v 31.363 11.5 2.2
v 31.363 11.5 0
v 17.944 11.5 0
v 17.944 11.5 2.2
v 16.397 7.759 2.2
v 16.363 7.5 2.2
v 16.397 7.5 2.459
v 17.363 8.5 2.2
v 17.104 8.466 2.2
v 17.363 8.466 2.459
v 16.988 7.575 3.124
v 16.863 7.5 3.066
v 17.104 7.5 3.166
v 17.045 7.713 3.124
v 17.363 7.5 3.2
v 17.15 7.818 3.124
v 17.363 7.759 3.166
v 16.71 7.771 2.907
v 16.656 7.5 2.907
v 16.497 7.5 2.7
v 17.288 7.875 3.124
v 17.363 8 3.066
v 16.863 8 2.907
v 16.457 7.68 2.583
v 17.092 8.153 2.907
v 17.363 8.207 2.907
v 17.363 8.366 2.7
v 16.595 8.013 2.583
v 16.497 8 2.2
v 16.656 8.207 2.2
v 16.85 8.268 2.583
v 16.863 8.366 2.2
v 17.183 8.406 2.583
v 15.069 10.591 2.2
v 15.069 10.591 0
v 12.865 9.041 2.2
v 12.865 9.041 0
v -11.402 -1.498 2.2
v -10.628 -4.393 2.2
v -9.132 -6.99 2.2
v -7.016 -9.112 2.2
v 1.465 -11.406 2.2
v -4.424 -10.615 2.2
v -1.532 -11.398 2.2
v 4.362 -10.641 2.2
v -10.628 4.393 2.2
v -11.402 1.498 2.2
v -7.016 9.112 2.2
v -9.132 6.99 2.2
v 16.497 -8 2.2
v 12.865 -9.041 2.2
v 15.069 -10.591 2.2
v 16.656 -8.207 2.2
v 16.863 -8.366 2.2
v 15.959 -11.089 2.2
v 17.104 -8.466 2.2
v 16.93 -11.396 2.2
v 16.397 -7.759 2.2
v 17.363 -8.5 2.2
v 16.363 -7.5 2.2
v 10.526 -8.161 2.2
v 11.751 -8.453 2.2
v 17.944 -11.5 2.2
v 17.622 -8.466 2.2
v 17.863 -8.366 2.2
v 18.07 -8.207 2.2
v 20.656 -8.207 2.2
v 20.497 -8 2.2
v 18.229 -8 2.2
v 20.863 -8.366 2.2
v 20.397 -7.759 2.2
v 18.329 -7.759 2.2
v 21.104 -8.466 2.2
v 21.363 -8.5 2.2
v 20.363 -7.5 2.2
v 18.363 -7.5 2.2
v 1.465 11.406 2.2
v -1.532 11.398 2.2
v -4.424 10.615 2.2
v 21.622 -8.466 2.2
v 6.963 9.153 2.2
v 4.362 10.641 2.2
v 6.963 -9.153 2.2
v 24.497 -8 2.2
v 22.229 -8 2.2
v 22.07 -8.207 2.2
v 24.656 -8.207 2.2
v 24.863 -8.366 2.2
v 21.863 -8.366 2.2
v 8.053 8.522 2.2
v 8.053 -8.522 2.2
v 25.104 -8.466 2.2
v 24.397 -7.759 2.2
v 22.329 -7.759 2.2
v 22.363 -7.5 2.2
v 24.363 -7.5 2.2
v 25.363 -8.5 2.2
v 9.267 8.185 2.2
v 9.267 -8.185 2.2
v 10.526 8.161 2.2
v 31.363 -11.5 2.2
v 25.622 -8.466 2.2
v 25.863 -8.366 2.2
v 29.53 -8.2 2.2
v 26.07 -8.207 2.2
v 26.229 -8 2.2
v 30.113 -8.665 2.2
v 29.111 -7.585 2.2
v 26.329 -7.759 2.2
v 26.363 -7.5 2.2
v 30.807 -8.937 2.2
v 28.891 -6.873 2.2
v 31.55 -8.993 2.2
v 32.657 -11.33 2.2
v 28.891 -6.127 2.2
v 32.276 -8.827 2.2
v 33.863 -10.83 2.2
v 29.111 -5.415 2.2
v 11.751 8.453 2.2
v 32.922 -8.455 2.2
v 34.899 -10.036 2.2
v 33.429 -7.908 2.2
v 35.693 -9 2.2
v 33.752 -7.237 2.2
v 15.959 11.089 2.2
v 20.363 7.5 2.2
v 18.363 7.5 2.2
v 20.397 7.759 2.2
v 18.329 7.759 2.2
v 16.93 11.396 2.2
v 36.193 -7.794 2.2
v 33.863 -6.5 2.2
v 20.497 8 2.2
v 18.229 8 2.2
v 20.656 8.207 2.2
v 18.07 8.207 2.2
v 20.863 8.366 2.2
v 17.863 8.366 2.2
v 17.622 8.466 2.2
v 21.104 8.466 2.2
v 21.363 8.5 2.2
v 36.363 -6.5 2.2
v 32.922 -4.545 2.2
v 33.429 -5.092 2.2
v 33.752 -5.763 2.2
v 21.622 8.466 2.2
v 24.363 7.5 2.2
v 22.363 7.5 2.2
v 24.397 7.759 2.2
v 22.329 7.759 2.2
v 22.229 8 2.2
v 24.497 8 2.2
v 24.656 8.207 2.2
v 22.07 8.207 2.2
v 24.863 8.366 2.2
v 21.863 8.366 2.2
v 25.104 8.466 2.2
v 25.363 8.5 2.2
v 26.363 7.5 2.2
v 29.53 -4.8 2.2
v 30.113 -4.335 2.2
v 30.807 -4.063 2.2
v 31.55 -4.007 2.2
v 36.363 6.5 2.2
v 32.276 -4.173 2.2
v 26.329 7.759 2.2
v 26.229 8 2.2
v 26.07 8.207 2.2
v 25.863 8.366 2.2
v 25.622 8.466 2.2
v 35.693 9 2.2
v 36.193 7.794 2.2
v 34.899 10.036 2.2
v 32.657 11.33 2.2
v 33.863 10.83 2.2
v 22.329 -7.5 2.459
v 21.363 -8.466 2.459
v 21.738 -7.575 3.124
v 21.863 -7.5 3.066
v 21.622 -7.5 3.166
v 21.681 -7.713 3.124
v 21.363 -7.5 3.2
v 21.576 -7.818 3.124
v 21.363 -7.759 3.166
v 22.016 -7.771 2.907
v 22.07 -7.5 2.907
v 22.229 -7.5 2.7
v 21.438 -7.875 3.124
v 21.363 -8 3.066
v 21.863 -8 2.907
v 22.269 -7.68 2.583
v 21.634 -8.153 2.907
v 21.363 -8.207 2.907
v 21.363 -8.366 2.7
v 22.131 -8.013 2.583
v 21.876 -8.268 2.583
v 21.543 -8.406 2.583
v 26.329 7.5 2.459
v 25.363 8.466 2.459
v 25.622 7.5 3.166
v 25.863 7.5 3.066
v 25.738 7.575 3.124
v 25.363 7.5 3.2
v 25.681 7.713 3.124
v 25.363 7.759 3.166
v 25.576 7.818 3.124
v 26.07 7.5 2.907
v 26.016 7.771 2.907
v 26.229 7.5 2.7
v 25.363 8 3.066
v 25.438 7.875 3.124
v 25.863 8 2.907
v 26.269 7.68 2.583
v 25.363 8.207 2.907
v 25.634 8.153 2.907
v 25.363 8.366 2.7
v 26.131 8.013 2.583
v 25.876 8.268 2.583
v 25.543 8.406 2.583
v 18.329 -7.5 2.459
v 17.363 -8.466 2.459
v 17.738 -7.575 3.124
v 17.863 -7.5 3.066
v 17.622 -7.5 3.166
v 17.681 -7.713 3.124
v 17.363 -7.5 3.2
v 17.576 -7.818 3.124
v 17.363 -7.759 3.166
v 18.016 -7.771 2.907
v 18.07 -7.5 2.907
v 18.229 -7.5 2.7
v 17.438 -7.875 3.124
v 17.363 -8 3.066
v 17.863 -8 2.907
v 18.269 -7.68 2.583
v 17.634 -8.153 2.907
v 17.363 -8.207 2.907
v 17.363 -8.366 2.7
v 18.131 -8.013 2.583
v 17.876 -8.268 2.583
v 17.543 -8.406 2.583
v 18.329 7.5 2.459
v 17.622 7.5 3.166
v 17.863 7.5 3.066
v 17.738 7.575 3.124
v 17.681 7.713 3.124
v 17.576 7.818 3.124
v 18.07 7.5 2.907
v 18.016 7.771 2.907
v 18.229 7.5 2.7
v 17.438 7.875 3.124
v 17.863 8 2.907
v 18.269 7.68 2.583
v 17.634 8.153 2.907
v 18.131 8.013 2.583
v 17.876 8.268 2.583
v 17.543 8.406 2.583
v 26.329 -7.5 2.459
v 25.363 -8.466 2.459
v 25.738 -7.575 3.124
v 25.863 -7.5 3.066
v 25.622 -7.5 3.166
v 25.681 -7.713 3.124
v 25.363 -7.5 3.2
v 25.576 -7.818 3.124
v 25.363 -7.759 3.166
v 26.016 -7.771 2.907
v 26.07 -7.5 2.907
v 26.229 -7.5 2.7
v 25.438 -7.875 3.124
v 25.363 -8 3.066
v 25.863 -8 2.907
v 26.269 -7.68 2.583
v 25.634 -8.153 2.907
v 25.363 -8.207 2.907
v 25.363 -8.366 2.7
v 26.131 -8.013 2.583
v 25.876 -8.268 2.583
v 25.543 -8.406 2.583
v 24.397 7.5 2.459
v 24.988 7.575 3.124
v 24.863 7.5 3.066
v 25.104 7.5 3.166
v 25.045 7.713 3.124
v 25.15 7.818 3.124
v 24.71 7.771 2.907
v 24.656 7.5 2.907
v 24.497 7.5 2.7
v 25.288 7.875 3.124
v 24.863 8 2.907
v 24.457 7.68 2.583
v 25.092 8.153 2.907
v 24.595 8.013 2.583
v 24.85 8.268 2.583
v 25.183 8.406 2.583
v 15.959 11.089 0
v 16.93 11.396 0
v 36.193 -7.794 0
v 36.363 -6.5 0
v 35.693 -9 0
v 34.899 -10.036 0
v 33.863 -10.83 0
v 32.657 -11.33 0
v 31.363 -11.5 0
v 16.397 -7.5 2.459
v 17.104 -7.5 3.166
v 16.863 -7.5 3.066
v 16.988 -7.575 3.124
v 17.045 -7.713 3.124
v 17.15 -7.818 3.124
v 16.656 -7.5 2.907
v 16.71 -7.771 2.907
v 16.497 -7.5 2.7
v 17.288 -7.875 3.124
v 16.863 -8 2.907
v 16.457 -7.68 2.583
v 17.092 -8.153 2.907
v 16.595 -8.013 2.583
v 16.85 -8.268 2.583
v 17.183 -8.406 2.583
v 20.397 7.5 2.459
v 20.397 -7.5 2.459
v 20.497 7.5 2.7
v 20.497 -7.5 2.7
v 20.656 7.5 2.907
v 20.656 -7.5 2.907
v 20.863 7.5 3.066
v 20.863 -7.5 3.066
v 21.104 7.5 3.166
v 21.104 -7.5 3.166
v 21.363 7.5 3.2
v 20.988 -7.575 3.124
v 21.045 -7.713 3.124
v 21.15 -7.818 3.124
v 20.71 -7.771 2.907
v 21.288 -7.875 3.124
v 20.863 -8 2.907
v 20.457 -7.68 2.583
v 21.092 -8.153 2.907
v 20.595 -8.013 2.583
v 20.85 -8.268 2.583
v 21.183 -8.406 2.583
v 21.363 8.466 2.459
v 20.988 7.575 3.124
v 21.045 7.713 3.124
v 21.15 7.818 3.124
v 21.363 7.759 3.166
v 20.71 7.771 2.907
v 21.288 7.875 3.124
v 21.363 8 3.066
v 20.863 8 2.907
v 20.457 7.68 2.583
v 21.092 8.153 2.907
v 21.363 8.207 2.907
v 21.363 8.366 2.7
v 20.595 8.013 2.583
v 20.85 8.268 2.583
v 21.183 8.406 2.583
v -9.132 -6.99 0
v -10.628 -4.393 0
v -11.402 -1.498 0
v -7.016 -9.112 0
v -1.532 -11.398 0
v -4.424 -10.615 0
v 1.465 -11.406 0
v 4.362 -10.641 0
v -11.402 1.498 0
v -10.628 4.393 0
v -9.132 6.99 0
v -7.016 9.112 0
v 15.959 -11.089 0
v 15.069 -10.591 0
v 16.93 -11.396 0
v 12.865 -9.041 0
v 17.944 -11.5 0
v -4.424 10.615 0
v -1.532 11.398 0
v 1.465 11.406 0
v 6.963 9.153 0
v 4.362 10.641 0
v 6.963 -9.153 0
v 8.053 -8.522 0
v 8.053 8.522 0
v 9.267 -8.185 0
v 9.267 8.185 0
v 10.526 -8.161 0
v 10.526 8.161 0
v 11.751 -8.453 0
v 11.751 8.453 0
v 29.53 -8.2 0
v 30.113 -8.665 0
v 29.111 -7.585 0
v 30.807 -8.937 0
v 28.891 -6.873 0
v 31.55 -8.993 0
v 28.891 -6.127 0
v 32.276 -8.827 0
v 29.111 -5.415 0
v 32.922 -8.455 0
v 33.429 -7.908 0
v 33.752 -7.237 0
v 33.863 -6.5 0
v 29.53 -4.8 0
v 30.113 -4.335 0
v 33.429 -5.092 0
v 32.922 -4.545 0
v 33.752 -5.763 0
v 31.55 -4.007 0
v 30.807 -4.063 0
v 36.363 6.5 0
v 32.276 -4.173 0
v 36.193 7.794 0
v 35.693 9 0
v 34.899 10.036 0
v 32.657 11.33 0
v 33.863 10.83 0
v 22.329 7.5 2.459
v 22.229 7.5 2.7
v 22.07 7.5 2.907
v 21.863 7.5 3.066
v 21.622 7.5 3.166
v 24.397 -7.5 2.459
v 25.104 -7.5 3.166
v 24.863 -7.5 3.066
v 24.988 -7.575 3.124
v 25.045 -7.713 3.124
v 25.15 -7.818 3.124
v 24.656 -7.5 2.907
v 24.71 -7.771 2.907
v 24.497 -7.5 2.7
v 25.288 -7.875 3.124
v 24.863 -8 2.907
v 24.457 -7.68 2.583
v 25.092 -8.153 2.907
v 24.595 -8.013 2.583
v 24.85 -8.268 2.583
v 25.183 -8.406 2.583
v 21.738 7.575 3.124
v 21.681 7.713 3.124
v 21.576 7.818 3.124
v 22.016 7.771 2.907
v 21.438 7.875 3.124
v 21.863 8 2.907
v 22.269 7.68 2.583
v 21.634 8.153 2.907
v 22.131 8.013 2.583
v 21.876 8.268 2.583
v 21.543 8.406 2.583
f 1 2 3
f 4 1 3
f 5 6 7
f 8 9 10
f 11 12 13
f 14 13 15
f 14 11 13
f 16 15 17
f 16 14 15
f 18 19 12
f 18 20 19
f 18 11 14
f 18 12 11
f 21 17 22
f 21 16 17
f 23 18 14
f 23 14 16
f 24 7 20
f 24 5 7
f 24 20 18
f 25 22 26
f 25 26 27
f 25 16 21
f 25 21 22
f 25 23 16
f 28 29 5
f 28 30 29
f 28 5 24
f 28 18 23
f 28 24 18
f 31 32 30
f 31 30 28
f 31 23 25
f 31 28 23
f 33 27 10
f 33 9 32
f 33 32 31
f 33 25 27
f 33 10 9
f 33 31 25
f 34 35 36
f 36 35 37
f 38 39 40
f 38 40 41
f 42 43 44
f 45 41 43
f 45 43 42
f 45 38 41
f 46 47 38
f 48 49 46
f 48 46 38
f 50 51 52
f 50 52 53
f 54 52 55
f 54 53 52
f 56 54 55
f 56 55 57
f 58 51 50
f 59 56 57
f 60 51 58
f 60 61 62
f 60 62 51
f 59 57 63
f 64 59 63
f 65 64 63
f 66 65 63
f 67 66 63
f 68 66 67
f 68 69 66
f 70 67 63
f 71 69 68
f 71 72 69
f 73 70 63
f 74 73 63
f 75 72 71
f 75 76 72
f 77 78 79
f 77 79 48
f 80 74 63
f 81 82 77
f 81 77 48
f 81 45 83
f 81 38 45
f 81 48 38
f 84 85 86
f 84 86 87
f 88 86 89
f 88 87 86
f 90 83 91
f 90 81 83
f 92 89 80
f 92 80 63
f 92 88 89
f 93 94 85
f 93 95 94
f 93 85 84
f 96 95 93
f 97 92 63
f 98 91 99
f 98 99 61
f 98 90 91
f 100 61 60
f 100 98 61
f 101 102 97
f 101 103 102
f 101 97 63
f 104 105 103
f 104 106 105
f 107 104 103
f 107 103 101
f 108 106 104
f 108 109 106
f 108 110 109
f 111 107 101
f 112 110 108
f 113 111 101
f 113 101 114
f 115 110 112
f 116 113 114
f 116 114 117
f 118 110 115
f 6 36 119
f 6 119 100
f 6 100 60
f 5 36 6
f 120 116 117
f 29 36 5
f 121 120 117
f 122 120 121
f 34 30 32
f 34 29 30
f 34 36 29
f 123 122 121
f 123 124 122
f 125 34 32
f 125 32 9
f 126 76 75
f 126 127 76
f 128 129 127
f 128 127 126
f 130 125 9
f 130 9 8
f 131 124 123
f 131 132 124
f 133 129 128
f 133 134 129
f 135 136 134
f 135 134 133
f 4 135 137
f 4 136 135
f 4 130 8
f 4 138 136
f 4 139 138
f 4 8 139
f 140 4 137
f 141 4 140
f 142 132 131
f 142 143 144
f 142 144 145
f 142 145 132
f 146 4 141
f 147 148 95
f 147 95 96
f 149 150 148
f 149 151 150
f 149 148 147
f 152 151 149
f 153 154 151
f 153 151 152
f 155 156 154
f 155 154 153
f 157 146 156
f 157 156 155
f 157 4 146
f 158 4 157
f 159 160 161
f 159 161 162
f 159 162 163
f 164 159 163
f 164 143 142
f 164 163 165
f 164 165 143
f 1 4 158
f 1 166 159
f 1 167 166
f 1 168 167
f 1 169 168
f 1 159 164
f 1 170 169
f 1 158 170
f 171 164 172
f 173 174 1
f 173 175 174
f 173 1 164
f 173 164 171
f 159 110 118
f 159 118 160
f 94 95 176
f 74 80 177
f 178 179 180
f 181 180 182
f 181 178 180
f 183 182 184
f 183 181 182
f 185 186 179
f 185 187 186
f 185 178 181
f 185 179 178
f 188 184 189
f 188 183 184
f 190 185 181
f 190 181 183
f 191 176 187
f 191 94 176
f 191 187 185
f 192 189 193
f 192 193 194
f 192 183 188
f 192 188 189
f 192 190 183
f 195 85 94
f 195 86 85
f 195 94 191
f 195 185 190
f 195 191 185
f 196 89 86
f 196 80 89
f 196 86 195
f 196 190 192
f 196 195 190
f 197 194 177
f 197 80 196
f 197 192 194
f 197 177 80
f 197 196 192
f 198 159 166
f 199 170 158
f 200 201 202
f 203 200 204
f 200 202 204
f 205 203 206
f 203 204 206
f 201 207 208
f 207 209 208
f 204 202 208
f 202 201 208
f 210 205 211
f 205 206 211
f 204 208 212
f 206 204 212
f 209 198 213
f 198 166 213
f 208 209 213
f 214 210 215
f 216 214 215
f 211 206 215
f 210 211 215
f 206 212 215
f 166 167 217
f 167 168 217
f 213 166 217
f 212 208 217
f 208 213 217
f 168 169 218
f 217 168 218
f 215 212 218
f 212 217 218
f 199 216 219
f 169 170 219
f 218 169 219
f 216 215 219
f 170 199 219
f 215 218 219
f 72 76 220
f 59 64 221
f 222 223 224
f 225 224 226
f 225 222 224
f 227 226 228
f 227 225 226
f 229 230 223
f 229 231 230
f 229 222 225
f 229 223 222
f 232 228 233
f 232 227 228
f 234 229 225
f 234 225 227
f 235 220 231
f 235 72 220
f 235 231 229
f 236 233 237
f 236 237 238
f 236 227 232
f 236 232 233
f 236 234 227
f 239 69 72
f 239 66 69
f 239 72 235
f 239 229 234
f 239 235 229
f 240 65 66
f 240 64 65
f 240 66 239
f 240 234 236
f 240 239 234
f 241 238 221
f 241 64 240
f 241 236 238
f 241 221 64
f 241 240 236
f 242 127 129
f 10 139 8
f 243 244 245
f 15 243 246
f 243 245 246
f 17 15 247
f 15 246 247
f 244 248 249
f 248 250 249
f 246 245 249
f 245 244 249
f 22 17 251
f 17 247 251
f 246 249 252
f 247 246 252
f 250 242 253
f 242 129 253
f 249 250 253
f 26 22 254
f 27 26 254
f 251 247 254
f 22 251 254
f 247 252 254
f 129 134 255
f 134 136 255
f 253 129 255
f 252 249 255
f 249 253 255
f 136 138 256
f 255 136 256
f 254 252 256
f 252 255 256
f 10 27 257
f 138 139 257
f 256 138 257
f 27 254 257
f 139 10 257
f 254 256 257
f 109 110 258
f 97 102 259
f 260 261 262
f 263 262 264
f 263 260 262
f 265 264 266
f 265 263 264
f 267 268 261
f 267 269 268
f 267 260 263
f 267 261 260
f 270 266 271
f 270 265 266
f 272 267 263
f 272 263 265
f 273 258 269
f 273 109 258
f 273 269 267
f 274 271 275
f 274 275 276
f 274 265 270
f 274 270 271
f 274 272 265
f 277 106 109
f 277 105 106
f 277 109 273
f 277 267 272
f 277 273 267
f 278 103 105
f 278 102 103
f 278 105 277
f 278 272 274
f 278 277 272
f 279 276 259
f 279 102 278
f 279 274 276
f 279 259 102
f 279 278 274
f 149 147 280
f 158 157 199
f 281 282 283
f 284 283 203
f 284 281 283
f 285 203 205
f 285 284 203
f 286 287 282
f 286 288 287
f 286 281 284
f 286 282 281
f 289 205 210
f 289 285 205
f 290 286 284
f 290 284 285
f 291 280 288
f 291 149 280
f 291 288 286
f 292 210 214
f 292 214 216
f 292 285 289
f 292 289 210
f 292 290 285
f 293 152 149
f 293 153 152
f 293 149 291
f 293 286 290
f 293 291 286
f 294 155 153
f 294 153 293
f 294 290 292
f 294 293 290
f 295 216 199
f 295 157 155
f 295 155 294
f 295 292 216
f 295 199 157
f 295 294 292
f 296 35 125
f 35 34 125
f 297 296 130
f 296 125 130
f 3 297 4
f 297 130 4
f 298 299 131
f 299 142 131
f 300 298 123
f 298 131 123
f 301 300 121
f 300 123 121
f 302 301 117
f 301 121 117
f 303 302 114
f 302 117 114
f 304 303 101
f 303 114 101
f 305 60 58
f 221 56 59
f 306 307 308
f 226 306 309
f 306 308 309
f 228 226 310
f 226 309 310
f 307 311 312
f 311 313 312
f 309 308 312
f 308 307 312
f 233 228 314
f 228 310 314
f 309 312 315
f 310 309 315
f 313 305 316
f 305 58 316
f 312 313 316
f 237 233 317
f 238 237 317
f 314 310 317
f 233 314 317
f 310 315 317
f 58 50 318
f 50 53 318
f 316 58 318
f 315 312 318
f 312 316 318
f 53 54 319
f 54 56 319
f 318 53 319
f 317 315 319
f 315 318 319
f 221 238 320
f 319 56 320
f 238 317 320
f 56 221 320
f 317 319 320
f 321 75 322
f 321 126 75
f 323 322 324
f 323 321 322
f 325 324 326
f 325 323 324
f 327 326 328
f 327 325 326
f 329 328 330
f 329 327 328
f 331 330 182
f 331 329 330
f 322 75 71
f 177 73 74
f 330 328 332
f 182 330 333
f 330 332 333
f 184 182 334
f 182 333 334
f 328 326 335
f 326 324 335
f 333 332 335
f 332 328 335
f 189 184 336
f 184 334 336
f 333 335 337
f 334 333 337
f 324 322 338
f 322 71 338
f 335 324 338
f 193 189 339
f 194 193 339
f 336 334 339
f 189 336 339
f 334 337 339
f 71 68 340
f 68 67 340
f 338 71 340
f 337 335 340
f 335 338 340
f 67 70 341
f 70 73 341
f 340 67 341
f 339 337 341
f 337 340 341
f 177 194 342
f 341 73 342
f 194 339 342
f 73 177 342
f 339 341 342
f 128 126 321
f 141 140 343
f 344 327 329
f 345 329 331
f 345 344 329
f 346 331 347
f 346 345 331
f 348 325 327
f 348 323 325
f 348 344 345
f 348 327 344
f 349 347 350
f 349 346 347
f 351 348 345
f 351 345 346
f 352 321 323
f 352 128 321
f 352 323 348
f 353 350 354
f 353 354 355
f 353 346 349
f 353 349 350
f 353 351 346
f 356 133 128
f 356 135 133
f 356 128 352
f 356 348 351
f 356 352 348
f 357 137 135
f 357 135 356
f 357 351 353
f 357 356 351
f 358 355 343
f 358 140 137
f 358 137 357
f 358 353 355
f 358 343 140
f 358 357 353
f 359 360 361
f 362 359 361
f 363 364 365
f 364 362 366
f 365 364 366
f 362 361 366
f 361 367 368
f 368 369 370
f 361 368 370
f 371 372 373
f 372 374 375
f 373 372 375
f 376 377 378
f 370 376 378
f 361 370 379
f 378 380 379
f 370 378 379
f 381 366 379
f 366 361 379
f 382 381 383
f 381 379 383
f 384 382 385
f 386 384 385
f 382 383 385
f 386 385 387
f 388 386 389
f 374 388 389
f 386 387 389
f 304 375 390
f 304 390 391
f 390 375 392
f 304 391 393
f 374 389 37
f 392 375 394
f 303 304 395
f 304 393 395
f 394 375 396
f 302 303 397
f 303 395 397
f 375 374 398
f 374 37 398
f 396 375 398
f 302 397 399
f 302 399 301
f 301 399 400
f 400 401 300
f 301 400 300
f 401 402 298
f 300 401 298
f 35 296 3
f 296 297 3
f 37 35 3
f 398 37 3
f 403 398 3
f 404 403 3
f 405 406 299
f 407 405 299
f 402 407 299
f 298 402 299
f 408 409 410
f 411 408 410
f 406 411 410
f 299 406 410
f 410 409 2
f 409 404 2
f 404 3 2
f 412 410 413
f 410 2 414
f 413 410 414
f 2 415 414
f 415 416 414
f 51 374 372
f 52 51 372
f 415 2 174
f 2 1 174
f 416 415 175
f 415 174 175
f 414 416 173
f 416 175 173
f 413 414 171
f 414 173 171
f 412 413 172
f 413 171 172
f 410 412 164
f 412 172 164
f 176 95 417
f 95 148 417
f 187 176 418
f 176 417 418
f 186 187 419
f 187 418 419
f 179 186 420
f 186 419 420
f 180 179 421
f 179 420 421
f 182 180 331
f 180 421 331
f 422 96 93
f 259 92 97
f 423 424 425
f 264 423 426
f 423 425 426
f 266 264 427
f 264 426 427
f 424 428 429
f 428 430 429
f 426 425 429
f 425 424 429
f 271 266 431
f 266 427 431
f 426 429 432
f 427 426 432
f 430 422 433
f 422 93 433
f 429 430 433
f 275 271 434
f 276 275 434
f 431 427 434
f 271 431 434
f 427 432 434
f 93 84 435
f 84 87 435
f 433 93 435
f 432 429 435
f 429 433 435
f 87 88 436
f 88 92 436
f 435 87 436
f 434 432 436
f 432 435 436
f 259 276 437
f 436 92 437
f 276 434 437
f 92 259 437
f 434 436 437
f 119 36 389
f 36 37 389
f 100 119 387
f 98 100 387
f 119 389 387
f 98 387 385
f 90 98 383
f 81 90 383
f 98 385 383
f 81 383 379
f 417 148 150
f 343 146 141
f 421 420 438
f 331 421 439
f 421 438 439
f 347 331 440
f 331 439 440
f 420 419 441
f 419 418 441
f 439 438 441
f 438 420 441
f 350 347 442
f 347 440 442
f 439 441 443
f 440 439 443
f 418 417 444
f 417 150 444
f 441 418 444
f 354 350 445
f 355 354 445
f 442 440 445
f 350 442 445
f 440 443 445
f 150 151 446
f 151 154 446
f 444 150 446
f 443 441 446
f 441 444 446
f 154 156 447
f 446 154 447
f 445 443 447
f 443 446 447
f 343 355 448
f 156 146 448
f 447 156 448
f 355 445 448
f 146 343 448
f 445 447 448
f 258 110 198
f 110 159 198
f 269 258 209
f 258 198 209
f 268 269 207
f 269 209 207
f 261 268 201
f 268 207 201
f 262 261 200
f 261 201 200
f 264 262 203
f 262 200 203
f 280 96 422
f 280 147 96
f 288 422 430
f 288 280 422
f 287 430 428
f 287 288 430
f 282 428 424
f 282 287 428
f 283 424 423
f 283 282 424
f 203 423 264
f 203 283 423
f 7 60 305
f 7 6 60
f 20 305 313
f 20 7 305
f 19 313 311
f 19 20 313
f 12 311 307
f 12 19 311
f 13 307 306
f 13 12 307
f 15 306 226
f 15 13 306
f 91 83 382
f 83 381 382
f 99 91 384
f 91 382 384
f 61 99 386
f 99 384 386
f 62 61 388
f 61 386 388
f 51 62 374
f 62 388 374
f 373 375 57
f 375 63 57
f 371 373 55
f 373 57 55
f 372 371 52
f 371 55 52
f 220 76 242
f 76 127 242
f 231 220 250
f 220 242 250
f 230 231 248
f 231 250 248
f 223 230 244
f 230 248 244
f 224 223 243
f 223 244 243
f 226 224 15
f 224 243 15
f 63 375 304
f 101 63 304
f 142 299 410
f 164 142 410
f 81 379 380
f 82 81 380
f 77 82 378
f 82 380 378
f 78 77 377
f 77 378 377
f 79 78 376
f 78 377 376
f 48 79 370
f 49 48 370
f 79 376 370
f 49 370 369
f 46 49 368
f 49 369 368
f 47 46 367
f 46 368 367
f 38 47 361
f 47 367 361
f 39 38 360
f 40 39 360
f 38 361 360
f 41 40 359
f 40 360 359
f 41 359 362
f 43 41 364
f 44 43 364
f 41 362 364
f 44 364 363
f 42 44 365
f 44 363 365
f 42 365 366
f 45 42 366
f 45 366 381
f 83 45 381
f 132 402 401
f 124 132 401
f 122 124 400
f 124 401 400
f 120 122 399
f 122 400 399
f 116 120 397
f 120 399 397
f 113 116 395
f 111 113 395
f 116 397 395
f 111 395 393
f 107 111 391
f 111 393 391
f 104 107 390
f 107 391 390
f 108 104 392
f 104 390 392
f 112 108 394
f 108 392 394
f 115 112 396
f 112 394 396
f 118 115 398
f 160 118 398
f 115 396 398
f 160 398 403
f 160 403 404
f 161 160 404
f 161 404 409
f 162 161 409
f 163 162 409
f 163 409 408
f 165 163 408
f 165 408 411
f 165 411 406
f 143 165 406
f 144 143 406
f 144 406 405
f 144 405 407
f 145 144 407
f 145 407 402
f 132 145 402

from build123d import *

# Parameters (mm, degrees)
F0_R     = 11.5
F1_DEPTH = 2.2
F3_DEPTH = 2.2
F4_R     = 2.5
F5_DEPTH = 2.201
F6_R     = 5
F7_W     = 2
F7_H     = 17
F8_DEPTH = 1
F9_R     = 0.99999


# Not quite as in the source:
# - a fillet or chamfer is up to 0.001 mm smaller than in the source, because OpenCascade refuses the exact size


with BuildPart() as f1:
    # F0 (on Top) → F1 (new body)
    with BuildSketch(Plane.XY):
        Circle(F0_R)
    extrude(amount=F1_DEPTH)

    # F2 (on Top) → F3 (join)
    with BuildSketch(Plane.XY):
        Polygon((16.363068172, 11.5), (0, 0), (16.363068172, -11.5), (36.363068172, -11.5), (36.363068172, 11.5), align=None)
    extrude(amount=F3_DEPTH)

    # F4 (on face) → F5 (cut, through all)
    with BuildSketch(Plane(origin=(0, 0, 0), x_dir=(1, 0, 0), z_dir=(0, 0, -1))):
        with Locations((31.363068172, 6.5)):
            Circle(F4_R)
    extrude(amount=-F5_DEPTH, mode=Mode.SUBTRACT)

    # F6
    f6_edges = [f1.edges().sort_by_distance(p)[0] for p in [
        (36.363068, -11.5, 1.1),
        (36.363068, 11.5, 1.1),
        (16.363068, -11.5, 1.1),
        (9.408764, -6.6125, 1.1),
        (9.408764, 6.6125, 1.1),
        (16.363068, 11.5, 1.1),
    ]]
    fillet(f6_edges, radius=F6_R)

    # F7 (on face) → F8 (join)
    with BuildSketch(Plane.XY.offset(2.2)):
        with Locations((17.363068172, 0)):
            Rectangle(F7_W, F7_H)
        with Locations((21.363068172, 0)):
            Rectangle(F7_W, F7_H)
        with Locations((25.363068172, 0)):
            Rectangle(F7_W, F7_H)
    extrude(amount=F8_DEPTH)

    # F9 (radius 1 in the source; OpenCascade refuses exactly that, so slightly less here)
    f9_edges = [f1.edges().sort_by_distance(p)[0] for p in [
        (16.363068, -8.5, 2.7),
        (18.363068, -8.5, 2.7),
        (20.363068, -8.5, 2.7),
        (22.363068, -8.5, 2.7),
        (24.363068, -8.5, 2.7),
        (26.363068, -8.5, 2.7),
        (26.363068, 8.5, 2.7),
        (16.363068, 8.5, 2.7),
        (24.363068, 8.5, 2.7),
        (22.363068, 8.5, 2.7),
        (18.363068, 8.5, 2.7),
        (20.363068, 8.5, 2.7),
        (20.363068, 0, 3.2),
        (22.363068, 0, 3.2),
        (21.363068, 8.5, 3.2),
        (21.363068, -8.5, 3.2),
        (18.363068, 0, 3.2),
        (16.363068, 0, 3.2),
        (17.363068, 8.5, 3.2),
        (17.363068, -8.5, 3.2),
        (26.363068, 0, 3.2),
        (24.363068, 0, 3.2),
        (25.363068, 8.5, 3.2),
        (25.363068, -8.5, 3.2),
    ]]
    fillet(f9_edges, radius=F9_R)


solid = f1.part
